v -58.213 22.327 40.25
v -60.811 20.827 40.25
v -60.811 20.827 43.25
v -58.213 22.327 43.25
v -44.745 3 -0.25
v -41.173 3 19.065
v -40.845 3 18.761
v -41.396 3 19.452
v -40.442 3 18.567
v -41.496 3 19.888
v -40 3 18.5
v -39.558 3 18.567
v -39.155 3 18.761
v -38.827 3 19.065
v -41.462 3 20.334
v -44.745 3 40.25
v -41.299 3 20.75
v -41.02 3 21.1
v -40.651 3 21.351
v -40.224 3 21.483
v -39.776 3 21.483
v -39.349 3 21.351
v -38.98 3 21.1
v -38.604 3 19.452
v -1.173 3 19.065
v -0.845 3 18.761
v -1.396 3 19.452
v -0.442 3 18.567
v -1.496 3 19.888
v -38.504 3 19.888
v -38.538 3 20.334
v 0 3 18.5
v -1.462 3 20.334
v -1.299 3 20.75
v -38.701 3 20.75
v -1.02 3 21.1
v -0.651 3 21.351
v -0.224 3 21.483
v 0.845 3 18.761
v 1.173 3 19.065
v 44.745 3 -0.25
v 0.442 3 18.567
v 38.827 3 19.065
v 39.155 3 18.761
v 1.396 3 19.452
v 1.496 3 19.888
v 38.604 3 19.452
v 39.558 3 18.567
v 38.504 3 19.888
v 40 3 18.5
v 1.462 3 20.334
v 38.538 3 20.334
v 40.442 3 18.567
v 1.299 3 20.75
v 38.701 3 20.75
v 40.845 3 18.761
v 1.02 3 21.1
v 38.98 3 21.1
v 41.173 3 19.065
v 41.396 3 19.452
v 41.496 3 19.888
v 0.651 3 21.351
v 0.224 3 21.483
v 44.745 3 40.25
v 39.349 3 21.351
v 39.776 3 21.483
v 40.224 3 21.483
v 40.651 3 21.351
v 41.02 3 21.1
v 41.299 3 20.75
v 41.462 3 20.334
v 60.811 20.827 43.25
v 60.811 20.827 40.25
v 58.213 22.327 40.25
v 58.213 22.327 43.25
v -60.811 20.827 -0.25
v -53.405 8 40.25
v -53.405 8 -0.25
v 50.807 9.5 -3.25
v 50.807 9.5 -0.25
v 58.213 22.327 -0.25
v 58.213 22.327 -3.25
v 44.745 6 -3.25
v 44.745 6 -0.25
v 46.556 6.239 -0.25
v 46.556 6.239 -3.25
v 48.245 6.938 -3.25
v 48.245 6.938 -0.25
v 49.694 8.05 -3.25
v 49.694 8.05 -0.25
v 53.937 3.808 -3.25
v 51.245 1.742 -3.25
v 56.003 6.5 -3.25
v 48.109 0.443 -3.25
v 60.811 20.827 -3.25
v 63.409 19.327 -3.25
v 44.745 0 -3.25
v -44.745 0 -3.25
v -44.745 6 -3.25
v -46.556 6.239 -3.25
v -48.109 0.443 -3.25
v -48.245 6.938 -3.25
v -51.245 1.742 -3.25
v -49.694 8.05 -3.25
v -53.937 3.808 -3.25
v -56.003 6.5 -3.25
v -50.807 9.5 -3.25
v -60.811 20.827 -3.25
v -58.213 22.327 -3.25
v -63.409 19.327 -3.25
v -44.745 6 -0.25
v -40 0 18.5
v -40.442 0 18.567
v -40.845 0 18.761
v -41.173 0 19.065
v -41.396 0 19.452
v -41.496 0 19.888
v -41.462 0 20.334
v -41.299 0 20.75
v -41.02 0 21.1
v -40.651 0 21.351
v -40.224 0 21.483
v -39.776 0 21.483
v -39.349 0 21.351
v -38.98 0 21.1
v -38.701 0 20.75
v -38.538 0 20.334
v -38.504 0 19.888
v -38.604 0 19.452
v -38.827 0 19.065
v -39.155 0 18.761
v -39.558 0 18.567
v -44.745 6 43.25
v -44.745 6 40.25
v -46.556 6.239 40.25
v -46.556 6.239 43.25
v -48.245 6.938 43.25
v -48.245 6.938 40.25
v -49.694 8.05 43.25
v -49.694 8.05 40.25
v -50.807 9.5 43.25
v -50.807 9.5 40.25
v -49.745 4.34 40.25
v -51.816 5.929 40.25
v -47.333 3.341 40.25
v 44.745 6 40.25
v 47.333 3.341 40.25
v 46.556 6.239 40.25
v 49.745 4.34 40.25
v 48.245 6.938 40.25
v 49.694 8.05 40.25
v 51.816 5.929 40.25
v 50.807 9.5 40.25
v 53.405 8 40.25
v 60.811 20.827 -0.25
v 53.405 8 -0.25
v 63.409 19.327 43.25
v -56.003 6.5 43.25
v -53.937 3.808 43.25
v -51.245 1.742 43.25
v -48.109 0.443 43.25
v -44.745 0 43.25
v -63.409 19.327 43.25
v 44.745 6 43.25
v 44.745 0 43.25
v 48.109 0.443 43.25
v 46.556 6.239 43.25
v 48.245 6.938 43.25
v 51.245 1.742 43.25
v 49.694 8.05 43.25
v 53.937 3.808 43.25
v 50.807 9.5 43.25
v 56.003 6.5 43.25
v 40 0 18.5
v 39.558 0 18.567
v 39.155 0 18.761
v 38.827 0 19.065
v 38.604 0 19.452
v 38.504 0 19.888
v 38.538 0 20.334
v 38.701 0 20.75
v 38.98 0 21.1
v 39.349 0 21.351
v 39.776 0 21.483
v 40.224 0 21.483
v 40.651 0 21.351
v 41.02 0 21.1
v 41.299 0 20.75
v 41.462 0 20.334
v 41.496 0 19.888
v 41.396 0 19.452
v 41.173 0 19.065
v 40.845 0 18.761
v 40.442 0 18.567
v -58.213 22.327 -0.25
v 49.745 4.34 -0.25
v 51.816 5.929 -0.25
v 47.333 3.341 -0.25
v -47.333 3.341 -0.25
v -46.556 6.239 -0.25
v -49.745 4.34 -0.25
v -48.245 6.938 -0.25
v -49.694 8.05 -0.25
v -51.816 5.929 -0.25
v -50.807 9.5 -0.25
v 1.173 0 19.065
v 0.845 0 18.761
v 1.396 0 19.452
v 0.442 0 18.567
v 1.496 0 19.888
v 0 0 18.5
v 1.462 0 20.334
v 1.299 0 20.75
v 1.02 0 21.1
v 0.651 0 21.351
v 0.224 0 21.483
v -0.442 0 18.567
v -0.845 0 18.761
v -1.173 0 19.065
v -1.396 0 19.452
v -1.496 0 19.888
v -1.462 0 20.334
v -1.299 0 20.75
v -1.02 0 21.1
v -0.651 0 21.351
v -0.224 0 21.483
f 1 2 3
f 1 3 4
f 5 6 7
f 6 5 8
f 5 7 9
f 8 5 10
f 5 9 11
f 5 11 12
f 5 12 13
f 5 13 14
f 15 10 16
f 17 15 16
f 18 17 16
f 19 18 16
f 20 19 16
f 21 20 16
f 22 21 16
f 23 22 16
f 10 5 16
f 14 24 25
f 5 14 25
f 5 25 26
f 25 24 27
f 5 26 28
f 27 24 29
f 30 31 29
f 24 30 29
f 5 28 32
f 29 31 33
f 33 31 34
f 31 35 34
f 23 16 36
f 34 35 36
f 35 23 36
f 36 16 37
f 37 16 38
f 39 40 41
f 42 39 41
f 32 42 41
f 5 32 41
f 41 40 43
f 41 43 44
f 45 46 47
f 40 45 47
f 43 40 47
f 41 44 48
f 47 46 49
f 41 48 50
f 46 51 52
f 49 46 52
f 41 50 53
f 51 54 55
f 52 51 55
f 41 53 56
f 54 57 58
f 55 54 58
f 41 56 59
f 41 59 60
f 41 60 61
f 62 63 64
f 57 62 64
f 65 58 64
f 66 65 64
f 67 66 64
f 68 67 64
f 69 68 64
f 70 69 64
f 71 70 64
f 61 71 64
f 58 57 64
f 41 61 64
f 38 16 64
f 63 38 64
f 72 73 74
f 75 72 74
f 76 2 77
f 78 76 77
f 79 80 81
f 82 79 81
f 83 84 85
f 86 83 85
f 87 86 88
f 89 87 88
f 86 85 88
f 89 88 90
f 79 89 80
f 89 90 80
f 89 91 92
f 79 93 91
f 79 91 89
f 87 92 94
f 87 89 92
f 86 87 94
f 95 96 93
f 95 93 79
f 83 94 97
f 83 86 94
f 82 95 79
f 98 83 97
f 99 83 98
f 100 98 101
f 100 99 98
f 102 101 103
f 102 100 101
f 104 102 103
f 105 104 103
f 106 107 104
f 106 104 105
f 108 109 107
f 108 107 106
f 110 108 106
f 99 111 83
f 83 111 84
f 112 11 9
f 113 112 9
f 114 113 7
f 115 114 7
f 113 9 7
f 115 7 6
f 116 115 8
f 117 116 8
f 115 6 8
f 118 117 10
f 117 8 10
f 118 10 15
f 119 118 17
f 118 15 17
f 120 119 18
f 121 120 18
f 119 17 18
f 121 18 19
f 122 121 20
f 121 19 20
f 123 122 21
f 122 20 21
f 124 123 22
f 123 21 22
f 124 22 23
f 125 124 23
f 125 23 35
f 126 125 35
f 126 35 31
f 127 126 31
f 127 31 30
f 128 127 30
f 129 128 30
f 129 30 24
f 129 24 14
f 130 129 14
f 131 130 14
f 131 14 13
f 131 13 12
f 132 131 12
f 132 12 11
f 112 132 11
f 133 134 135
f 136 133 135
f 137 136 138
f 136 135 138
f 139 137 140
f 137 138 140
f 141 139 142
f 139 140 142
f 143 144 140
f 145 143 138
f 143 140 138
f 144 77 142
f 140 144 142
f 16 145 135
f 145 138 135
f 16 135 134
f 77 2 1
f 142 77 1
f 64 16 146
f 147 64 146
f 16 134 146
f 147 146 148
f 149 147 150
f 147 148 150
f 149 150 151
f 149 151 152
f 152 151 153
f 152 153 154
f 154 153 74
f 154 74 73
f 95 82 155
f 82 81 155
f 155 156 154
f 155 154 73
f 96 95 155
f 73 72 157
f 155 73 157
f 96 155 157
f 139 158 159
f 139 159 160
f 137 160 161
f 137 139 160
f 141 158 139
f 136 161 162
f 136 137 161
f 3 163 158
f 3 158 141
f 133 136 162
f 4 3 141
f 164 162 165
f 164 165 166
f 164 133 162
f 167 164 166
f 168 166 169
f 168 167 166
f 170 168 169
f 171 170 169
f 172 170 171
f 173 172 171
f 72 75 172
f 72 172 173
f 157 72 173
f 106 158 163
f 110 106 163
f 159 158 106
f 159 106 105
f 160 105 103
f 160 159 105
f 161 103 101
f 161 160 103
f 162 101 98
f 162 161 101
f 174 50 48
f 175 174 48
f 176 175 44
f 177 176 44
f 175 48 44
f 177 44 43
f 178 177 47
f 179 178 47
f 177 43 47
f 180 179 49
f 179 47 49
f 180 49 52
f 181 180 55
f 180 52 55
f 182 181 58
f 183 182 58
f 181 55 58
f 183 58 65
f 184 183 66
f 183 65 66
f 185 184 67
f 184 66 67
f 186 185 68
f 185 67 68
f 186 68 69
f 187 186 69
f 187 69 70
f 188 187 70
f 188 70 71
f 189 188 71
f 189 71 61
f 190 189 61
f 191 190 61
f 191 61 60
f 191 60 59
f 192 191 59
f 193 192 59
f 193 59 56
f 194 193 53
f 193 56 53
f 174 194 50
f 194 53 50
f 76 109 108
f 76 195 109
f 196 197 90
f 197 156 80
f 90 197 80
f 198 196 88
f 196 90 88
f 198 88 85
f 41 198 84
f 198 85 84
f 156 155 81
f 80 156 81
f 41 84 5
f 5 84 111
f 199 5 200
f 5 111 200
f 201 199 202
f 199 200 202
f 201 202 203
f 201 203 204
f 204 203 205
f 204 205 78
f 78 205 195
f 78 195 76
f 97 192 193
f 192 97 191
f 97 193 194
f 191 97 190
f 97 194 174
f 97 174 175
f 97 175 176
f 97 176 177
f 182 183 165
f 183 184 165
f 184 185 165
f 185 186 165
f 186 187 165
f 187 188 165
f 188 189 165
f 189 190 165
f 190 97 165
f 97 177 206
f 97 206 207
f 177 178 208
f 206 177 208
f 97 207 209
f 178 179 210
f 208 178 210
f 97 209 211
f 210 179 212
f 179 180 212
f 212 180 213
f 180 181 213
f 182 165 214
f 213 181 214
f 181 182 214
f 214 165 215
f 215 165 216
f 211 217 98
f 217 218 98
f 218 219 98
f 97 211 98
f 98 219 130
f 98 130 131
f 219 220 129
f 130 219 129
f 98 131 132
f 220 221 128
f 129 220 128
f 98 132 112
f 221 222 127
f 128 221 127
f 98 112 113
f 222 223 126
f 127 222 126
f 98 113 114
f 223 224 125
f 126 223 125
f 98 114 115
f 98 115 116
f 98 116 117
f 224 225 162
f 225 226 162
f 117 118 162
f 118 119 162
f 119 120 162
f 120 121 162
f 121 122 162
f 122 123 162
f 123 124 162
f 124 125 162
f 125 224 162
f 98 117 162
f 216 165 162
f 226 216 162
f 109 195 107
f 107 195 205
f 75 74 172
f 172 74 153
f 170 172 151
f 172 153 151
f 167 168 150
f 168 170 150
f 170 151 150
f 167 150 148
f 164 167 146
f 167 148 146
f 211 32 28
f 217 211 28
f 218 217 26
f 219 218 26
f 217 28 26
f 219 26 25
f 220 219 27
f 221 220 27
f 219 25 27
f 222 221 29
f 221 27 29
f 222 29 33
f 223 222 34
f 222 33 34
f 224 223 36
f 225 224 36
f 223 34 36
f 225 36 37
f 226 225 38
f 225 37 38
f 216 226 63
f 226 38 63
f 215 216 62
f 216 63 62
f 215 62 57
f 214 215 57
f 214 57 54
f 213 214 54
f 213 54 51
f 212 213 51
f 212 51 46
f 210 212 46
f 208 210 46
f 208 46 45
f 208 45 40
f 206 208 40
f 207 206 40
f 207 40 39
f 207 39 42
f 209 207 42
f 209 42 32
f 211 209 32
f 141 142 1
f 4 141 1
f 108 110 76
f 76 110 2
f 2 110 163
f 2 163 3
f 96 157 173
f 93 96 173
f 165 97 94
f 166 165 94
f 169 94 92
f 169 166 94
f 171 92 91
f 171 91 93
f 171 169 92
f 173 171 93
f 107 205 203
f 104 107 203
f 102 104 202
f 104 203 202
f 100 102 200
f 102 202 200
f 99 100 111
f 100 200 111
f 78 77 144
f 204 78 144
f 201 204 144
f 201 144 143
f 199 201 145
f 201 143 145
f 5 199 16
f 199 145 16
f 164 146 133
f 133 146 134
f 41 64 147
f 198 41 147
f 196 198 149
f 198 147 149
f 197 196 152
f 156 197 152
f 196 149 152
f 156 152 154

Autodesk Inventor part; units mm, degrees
ref_plane "YZ Plane" through (0, 0, 0) normal (1, 0, 0) x (0, 1, 0)
ref_plane "XZ Plane" through (0, 0, 0) normal (0, 1, 0) x (-1, 0, 0)
sketch "Sketch1" plane through (0, 0, 0) normal (0, 0, 1) x (1, 0, 0)
  arc A0 (-53.4049, 8) -> (-44.7446, 3) centre (-44.7446, 13) ccw
  line L0 (-44.7446, 3) -> (44.7446, 3)
  arc A1 (44.7446, 3) -> (53.4049, 8) centre (44.7446, 13) ccw
  line L1 (53.4049, 8) -> (60.8108, 20.8273)
  line L2 (-60.8108, 20.8273) -> (-53.4049, 8)
  line L3 (63.4088, 19.3273) -> (56.003, 6.5)
  arc A2 (44.7446, 0) -> (56.003, 6.5) centre (44.7446, 13) ccw
  line L4 (44.7446, 0) -> (-44.7446, 0)
  arc A3 (-56.003, 6.5) -> (-44.7446, 0) centre (-44.7446, 13) ccw
  line L5 (-56.003, 6.5) -> (-63.4088, 19.3273)
  line L6 (-63.4088, 19.3273) -> (-60.8108, 20.8273)
  line L7 (-60.8108, 20.8273) -> (60.8108, 20.8273) construction
  line L8 (-63.4088, 19.3273) -> (63.4088, 19.3273) construction
  line L9 (60.8108, 20.8273) -> (63.4088, 19.3273)
  point P0 (0, 0)
  point P1 (0, 0)
extrude "Extrusion1" add sketch "Sketch1" along normal blind 40
sketch "Sketch2" plane through (-44.7446, 0, 0) normal (0, -1, 0) x (1, 0, 0)
  line L0 (89.4893, 0) -> (0, 0) projected
  line L1 (-11.2583, 0) -> (-11.2583, 40) projected
  line L2 (0, 0) -> (0, 40) projected
  line L3 (89.4893, 0) -> (89.4893, 40) projected
  point P0 (44.7446, 0)
  point P1 (4.7446, 20)
  point P2 (44.7446, 20)
  point P3 (84.7446, 20)
  point P4 (44.7446, 0)
  point P5 (-11.2583, 20)
  dimension "d3" = 40
  dimension "d4" = 40
  dimension "d30" = 4.7447
  dimension "d31" = 4.7447
hole "Hole1" at (-40, 0, 20) at (0, 0, 20) at (40, 0, 20) direction (0, 1, 0) diameter 3 end through all
sketch "Sketch3" plane through (-44.7446, 0, 0) normal (0, -1, 0) x (1, 0, 0)
  circle A0 centre (44.7446, 20) radius 1.5 projected
  line L0 (89.4893, 0) -> (0, 0) projected
  line L1 (0, 0) -> (0, 40) projected
  line L2 (0, 20) -> (89.4893, 20) construction
  line L3 (89.4893, 0) -> (89.4893, 40) projected
  point P0 (44.7446, 0)
  point P1 (24.7446, 7)
  point P2 (64.7446, 7)
  point P3 (24.7446, 33)
  point P4 (64.7446, 33)
  dimension "d12" = 20
  dimension "d13" = 20
  dimension "d14" = 7
hole "Hole2" [suppressed]
ref_plane "Work Plane2" through (0, 0, 20) normal (0, 0, 1) x (1, 0, 0)
sketch "Sketch5" plane through (0, 0, 40) normal (0, 0, 1) x (1, 0, 0)
  arc A0 (-53.4049, 8) -> (-44.7446, 3) centre (-44.7446, 13) ccw projected
  line L0 (-53.4049, 8) -> (-60.8108, 20.8273) projected
  line L1 (-60.8108, 20.8273) -> (-63.4088, 19.3273) projected
  line L2 (-63.4088, 19.3273) -> (-56.003, 6.5) projected
  arc A1 (-56.003, 6.5) -> (-44.7446, 0) centre (-44.7446, 13) ccw projected
  line L3 (-44.7446, 0) -> (44.7446, 0) projected
  arc A2 (44.7446, 0) -> (56.003, 6.5) centre (44.7446, 13) ccw projected
  line L4 (56.003, 6.5) -> (63.4088, 19.3273) projected
  line L5 (63.4088, 19.3273) -> (60.8108, 20.8273) projected
  line L6 (60.8108, 20.8273) -> (53.4049, 8) projected
  arc A3 (44.7446, 3) -> (53.4049, 8) centre (44.7446, 13) ccw projected
  line L7 (44.7446, 3) -> (-44.7446, 3) projected
  point P0 (0, 0)
extrude "Extrusion3" add sketch "Sketch5" along normal blind 0.25
sketch "Sketch6" plane through (0, 0, 40.25) normal (0, 0, 1) x (1, 0, 0)
  arc A0 (-53.4049, 8) -> (-44.7446, 3) centre (-44.7446, 13) ccw projected
  line L0 (-53.4049, 8) -> (-60.8108, 20.8273) projected
  line L1 (-60.8108, 20.8273) -> (-63.4088, 19.3273) projected
  line L2 (-63.4088, 19.3273) -> (-56.003, 6.5) projected
  arc A1 (-56.003, 6.5) -> (-44.7446, 0) centre (-44.7446, 13) ccw projected
  line L3 (-44.7446, 0) -> (44.7446, 0) projected
  arc A2 (44.7446, 0) -> (56.003, 6.5) centre (44.7446, 13) ccw projected
  line L4 (56.003, 6.5) -> (63.4088, 19.3273) projected
  line L5 (63.4088, 19.3273) -> (60.8108, 20.8273) projected
  line L6 (60.8108, 20.8273) -> (53.4049, 8) projected
  arc A3 (44.7446, 3) -> (53.4049, 8) centre (44.7446, 13) ccw projected
  line L7 (44.7446, 3) -> (-44.7446, 3) projected
  arc A4 (-50.8068, 9.5) -> (-44.7446, 6) centre (-44.7446, 13) ccw
  line L8 (-50.8068, 9.5) -> (-58.2127, 22.3273)
  line L9 (58.2127, 22.3273) -> (50.8068, 9.5)
  arc A5 (44.7446, 6) -> (50.8068, 9.5) centre (44.7446, 13) ccw
  line L10 (44.7446, 6) -> (-44.7446, 6)
  line L11 (-63.4088, 19.3273) -> (-60.8108, 20.8273) projected
  line L12 (-63.4088, 19.3273) -> (-58.2127, 22.3273)
  line L13 (63.4088, 19.3273) -> (58.2127, 22.3273)
  dimension "d27" = 3
extrude "Extrusion4" add sketch "Sketch6" along normal blind 3
mirror "Mirror2" about plane through (0, 0, 20) normal (0, 0, 1) of "Extrusion3", "Extrusion4"
equation "\"d4\" = d3"
equation "\"d13\" = d12"
properties part number "Drill Helper v 1"
